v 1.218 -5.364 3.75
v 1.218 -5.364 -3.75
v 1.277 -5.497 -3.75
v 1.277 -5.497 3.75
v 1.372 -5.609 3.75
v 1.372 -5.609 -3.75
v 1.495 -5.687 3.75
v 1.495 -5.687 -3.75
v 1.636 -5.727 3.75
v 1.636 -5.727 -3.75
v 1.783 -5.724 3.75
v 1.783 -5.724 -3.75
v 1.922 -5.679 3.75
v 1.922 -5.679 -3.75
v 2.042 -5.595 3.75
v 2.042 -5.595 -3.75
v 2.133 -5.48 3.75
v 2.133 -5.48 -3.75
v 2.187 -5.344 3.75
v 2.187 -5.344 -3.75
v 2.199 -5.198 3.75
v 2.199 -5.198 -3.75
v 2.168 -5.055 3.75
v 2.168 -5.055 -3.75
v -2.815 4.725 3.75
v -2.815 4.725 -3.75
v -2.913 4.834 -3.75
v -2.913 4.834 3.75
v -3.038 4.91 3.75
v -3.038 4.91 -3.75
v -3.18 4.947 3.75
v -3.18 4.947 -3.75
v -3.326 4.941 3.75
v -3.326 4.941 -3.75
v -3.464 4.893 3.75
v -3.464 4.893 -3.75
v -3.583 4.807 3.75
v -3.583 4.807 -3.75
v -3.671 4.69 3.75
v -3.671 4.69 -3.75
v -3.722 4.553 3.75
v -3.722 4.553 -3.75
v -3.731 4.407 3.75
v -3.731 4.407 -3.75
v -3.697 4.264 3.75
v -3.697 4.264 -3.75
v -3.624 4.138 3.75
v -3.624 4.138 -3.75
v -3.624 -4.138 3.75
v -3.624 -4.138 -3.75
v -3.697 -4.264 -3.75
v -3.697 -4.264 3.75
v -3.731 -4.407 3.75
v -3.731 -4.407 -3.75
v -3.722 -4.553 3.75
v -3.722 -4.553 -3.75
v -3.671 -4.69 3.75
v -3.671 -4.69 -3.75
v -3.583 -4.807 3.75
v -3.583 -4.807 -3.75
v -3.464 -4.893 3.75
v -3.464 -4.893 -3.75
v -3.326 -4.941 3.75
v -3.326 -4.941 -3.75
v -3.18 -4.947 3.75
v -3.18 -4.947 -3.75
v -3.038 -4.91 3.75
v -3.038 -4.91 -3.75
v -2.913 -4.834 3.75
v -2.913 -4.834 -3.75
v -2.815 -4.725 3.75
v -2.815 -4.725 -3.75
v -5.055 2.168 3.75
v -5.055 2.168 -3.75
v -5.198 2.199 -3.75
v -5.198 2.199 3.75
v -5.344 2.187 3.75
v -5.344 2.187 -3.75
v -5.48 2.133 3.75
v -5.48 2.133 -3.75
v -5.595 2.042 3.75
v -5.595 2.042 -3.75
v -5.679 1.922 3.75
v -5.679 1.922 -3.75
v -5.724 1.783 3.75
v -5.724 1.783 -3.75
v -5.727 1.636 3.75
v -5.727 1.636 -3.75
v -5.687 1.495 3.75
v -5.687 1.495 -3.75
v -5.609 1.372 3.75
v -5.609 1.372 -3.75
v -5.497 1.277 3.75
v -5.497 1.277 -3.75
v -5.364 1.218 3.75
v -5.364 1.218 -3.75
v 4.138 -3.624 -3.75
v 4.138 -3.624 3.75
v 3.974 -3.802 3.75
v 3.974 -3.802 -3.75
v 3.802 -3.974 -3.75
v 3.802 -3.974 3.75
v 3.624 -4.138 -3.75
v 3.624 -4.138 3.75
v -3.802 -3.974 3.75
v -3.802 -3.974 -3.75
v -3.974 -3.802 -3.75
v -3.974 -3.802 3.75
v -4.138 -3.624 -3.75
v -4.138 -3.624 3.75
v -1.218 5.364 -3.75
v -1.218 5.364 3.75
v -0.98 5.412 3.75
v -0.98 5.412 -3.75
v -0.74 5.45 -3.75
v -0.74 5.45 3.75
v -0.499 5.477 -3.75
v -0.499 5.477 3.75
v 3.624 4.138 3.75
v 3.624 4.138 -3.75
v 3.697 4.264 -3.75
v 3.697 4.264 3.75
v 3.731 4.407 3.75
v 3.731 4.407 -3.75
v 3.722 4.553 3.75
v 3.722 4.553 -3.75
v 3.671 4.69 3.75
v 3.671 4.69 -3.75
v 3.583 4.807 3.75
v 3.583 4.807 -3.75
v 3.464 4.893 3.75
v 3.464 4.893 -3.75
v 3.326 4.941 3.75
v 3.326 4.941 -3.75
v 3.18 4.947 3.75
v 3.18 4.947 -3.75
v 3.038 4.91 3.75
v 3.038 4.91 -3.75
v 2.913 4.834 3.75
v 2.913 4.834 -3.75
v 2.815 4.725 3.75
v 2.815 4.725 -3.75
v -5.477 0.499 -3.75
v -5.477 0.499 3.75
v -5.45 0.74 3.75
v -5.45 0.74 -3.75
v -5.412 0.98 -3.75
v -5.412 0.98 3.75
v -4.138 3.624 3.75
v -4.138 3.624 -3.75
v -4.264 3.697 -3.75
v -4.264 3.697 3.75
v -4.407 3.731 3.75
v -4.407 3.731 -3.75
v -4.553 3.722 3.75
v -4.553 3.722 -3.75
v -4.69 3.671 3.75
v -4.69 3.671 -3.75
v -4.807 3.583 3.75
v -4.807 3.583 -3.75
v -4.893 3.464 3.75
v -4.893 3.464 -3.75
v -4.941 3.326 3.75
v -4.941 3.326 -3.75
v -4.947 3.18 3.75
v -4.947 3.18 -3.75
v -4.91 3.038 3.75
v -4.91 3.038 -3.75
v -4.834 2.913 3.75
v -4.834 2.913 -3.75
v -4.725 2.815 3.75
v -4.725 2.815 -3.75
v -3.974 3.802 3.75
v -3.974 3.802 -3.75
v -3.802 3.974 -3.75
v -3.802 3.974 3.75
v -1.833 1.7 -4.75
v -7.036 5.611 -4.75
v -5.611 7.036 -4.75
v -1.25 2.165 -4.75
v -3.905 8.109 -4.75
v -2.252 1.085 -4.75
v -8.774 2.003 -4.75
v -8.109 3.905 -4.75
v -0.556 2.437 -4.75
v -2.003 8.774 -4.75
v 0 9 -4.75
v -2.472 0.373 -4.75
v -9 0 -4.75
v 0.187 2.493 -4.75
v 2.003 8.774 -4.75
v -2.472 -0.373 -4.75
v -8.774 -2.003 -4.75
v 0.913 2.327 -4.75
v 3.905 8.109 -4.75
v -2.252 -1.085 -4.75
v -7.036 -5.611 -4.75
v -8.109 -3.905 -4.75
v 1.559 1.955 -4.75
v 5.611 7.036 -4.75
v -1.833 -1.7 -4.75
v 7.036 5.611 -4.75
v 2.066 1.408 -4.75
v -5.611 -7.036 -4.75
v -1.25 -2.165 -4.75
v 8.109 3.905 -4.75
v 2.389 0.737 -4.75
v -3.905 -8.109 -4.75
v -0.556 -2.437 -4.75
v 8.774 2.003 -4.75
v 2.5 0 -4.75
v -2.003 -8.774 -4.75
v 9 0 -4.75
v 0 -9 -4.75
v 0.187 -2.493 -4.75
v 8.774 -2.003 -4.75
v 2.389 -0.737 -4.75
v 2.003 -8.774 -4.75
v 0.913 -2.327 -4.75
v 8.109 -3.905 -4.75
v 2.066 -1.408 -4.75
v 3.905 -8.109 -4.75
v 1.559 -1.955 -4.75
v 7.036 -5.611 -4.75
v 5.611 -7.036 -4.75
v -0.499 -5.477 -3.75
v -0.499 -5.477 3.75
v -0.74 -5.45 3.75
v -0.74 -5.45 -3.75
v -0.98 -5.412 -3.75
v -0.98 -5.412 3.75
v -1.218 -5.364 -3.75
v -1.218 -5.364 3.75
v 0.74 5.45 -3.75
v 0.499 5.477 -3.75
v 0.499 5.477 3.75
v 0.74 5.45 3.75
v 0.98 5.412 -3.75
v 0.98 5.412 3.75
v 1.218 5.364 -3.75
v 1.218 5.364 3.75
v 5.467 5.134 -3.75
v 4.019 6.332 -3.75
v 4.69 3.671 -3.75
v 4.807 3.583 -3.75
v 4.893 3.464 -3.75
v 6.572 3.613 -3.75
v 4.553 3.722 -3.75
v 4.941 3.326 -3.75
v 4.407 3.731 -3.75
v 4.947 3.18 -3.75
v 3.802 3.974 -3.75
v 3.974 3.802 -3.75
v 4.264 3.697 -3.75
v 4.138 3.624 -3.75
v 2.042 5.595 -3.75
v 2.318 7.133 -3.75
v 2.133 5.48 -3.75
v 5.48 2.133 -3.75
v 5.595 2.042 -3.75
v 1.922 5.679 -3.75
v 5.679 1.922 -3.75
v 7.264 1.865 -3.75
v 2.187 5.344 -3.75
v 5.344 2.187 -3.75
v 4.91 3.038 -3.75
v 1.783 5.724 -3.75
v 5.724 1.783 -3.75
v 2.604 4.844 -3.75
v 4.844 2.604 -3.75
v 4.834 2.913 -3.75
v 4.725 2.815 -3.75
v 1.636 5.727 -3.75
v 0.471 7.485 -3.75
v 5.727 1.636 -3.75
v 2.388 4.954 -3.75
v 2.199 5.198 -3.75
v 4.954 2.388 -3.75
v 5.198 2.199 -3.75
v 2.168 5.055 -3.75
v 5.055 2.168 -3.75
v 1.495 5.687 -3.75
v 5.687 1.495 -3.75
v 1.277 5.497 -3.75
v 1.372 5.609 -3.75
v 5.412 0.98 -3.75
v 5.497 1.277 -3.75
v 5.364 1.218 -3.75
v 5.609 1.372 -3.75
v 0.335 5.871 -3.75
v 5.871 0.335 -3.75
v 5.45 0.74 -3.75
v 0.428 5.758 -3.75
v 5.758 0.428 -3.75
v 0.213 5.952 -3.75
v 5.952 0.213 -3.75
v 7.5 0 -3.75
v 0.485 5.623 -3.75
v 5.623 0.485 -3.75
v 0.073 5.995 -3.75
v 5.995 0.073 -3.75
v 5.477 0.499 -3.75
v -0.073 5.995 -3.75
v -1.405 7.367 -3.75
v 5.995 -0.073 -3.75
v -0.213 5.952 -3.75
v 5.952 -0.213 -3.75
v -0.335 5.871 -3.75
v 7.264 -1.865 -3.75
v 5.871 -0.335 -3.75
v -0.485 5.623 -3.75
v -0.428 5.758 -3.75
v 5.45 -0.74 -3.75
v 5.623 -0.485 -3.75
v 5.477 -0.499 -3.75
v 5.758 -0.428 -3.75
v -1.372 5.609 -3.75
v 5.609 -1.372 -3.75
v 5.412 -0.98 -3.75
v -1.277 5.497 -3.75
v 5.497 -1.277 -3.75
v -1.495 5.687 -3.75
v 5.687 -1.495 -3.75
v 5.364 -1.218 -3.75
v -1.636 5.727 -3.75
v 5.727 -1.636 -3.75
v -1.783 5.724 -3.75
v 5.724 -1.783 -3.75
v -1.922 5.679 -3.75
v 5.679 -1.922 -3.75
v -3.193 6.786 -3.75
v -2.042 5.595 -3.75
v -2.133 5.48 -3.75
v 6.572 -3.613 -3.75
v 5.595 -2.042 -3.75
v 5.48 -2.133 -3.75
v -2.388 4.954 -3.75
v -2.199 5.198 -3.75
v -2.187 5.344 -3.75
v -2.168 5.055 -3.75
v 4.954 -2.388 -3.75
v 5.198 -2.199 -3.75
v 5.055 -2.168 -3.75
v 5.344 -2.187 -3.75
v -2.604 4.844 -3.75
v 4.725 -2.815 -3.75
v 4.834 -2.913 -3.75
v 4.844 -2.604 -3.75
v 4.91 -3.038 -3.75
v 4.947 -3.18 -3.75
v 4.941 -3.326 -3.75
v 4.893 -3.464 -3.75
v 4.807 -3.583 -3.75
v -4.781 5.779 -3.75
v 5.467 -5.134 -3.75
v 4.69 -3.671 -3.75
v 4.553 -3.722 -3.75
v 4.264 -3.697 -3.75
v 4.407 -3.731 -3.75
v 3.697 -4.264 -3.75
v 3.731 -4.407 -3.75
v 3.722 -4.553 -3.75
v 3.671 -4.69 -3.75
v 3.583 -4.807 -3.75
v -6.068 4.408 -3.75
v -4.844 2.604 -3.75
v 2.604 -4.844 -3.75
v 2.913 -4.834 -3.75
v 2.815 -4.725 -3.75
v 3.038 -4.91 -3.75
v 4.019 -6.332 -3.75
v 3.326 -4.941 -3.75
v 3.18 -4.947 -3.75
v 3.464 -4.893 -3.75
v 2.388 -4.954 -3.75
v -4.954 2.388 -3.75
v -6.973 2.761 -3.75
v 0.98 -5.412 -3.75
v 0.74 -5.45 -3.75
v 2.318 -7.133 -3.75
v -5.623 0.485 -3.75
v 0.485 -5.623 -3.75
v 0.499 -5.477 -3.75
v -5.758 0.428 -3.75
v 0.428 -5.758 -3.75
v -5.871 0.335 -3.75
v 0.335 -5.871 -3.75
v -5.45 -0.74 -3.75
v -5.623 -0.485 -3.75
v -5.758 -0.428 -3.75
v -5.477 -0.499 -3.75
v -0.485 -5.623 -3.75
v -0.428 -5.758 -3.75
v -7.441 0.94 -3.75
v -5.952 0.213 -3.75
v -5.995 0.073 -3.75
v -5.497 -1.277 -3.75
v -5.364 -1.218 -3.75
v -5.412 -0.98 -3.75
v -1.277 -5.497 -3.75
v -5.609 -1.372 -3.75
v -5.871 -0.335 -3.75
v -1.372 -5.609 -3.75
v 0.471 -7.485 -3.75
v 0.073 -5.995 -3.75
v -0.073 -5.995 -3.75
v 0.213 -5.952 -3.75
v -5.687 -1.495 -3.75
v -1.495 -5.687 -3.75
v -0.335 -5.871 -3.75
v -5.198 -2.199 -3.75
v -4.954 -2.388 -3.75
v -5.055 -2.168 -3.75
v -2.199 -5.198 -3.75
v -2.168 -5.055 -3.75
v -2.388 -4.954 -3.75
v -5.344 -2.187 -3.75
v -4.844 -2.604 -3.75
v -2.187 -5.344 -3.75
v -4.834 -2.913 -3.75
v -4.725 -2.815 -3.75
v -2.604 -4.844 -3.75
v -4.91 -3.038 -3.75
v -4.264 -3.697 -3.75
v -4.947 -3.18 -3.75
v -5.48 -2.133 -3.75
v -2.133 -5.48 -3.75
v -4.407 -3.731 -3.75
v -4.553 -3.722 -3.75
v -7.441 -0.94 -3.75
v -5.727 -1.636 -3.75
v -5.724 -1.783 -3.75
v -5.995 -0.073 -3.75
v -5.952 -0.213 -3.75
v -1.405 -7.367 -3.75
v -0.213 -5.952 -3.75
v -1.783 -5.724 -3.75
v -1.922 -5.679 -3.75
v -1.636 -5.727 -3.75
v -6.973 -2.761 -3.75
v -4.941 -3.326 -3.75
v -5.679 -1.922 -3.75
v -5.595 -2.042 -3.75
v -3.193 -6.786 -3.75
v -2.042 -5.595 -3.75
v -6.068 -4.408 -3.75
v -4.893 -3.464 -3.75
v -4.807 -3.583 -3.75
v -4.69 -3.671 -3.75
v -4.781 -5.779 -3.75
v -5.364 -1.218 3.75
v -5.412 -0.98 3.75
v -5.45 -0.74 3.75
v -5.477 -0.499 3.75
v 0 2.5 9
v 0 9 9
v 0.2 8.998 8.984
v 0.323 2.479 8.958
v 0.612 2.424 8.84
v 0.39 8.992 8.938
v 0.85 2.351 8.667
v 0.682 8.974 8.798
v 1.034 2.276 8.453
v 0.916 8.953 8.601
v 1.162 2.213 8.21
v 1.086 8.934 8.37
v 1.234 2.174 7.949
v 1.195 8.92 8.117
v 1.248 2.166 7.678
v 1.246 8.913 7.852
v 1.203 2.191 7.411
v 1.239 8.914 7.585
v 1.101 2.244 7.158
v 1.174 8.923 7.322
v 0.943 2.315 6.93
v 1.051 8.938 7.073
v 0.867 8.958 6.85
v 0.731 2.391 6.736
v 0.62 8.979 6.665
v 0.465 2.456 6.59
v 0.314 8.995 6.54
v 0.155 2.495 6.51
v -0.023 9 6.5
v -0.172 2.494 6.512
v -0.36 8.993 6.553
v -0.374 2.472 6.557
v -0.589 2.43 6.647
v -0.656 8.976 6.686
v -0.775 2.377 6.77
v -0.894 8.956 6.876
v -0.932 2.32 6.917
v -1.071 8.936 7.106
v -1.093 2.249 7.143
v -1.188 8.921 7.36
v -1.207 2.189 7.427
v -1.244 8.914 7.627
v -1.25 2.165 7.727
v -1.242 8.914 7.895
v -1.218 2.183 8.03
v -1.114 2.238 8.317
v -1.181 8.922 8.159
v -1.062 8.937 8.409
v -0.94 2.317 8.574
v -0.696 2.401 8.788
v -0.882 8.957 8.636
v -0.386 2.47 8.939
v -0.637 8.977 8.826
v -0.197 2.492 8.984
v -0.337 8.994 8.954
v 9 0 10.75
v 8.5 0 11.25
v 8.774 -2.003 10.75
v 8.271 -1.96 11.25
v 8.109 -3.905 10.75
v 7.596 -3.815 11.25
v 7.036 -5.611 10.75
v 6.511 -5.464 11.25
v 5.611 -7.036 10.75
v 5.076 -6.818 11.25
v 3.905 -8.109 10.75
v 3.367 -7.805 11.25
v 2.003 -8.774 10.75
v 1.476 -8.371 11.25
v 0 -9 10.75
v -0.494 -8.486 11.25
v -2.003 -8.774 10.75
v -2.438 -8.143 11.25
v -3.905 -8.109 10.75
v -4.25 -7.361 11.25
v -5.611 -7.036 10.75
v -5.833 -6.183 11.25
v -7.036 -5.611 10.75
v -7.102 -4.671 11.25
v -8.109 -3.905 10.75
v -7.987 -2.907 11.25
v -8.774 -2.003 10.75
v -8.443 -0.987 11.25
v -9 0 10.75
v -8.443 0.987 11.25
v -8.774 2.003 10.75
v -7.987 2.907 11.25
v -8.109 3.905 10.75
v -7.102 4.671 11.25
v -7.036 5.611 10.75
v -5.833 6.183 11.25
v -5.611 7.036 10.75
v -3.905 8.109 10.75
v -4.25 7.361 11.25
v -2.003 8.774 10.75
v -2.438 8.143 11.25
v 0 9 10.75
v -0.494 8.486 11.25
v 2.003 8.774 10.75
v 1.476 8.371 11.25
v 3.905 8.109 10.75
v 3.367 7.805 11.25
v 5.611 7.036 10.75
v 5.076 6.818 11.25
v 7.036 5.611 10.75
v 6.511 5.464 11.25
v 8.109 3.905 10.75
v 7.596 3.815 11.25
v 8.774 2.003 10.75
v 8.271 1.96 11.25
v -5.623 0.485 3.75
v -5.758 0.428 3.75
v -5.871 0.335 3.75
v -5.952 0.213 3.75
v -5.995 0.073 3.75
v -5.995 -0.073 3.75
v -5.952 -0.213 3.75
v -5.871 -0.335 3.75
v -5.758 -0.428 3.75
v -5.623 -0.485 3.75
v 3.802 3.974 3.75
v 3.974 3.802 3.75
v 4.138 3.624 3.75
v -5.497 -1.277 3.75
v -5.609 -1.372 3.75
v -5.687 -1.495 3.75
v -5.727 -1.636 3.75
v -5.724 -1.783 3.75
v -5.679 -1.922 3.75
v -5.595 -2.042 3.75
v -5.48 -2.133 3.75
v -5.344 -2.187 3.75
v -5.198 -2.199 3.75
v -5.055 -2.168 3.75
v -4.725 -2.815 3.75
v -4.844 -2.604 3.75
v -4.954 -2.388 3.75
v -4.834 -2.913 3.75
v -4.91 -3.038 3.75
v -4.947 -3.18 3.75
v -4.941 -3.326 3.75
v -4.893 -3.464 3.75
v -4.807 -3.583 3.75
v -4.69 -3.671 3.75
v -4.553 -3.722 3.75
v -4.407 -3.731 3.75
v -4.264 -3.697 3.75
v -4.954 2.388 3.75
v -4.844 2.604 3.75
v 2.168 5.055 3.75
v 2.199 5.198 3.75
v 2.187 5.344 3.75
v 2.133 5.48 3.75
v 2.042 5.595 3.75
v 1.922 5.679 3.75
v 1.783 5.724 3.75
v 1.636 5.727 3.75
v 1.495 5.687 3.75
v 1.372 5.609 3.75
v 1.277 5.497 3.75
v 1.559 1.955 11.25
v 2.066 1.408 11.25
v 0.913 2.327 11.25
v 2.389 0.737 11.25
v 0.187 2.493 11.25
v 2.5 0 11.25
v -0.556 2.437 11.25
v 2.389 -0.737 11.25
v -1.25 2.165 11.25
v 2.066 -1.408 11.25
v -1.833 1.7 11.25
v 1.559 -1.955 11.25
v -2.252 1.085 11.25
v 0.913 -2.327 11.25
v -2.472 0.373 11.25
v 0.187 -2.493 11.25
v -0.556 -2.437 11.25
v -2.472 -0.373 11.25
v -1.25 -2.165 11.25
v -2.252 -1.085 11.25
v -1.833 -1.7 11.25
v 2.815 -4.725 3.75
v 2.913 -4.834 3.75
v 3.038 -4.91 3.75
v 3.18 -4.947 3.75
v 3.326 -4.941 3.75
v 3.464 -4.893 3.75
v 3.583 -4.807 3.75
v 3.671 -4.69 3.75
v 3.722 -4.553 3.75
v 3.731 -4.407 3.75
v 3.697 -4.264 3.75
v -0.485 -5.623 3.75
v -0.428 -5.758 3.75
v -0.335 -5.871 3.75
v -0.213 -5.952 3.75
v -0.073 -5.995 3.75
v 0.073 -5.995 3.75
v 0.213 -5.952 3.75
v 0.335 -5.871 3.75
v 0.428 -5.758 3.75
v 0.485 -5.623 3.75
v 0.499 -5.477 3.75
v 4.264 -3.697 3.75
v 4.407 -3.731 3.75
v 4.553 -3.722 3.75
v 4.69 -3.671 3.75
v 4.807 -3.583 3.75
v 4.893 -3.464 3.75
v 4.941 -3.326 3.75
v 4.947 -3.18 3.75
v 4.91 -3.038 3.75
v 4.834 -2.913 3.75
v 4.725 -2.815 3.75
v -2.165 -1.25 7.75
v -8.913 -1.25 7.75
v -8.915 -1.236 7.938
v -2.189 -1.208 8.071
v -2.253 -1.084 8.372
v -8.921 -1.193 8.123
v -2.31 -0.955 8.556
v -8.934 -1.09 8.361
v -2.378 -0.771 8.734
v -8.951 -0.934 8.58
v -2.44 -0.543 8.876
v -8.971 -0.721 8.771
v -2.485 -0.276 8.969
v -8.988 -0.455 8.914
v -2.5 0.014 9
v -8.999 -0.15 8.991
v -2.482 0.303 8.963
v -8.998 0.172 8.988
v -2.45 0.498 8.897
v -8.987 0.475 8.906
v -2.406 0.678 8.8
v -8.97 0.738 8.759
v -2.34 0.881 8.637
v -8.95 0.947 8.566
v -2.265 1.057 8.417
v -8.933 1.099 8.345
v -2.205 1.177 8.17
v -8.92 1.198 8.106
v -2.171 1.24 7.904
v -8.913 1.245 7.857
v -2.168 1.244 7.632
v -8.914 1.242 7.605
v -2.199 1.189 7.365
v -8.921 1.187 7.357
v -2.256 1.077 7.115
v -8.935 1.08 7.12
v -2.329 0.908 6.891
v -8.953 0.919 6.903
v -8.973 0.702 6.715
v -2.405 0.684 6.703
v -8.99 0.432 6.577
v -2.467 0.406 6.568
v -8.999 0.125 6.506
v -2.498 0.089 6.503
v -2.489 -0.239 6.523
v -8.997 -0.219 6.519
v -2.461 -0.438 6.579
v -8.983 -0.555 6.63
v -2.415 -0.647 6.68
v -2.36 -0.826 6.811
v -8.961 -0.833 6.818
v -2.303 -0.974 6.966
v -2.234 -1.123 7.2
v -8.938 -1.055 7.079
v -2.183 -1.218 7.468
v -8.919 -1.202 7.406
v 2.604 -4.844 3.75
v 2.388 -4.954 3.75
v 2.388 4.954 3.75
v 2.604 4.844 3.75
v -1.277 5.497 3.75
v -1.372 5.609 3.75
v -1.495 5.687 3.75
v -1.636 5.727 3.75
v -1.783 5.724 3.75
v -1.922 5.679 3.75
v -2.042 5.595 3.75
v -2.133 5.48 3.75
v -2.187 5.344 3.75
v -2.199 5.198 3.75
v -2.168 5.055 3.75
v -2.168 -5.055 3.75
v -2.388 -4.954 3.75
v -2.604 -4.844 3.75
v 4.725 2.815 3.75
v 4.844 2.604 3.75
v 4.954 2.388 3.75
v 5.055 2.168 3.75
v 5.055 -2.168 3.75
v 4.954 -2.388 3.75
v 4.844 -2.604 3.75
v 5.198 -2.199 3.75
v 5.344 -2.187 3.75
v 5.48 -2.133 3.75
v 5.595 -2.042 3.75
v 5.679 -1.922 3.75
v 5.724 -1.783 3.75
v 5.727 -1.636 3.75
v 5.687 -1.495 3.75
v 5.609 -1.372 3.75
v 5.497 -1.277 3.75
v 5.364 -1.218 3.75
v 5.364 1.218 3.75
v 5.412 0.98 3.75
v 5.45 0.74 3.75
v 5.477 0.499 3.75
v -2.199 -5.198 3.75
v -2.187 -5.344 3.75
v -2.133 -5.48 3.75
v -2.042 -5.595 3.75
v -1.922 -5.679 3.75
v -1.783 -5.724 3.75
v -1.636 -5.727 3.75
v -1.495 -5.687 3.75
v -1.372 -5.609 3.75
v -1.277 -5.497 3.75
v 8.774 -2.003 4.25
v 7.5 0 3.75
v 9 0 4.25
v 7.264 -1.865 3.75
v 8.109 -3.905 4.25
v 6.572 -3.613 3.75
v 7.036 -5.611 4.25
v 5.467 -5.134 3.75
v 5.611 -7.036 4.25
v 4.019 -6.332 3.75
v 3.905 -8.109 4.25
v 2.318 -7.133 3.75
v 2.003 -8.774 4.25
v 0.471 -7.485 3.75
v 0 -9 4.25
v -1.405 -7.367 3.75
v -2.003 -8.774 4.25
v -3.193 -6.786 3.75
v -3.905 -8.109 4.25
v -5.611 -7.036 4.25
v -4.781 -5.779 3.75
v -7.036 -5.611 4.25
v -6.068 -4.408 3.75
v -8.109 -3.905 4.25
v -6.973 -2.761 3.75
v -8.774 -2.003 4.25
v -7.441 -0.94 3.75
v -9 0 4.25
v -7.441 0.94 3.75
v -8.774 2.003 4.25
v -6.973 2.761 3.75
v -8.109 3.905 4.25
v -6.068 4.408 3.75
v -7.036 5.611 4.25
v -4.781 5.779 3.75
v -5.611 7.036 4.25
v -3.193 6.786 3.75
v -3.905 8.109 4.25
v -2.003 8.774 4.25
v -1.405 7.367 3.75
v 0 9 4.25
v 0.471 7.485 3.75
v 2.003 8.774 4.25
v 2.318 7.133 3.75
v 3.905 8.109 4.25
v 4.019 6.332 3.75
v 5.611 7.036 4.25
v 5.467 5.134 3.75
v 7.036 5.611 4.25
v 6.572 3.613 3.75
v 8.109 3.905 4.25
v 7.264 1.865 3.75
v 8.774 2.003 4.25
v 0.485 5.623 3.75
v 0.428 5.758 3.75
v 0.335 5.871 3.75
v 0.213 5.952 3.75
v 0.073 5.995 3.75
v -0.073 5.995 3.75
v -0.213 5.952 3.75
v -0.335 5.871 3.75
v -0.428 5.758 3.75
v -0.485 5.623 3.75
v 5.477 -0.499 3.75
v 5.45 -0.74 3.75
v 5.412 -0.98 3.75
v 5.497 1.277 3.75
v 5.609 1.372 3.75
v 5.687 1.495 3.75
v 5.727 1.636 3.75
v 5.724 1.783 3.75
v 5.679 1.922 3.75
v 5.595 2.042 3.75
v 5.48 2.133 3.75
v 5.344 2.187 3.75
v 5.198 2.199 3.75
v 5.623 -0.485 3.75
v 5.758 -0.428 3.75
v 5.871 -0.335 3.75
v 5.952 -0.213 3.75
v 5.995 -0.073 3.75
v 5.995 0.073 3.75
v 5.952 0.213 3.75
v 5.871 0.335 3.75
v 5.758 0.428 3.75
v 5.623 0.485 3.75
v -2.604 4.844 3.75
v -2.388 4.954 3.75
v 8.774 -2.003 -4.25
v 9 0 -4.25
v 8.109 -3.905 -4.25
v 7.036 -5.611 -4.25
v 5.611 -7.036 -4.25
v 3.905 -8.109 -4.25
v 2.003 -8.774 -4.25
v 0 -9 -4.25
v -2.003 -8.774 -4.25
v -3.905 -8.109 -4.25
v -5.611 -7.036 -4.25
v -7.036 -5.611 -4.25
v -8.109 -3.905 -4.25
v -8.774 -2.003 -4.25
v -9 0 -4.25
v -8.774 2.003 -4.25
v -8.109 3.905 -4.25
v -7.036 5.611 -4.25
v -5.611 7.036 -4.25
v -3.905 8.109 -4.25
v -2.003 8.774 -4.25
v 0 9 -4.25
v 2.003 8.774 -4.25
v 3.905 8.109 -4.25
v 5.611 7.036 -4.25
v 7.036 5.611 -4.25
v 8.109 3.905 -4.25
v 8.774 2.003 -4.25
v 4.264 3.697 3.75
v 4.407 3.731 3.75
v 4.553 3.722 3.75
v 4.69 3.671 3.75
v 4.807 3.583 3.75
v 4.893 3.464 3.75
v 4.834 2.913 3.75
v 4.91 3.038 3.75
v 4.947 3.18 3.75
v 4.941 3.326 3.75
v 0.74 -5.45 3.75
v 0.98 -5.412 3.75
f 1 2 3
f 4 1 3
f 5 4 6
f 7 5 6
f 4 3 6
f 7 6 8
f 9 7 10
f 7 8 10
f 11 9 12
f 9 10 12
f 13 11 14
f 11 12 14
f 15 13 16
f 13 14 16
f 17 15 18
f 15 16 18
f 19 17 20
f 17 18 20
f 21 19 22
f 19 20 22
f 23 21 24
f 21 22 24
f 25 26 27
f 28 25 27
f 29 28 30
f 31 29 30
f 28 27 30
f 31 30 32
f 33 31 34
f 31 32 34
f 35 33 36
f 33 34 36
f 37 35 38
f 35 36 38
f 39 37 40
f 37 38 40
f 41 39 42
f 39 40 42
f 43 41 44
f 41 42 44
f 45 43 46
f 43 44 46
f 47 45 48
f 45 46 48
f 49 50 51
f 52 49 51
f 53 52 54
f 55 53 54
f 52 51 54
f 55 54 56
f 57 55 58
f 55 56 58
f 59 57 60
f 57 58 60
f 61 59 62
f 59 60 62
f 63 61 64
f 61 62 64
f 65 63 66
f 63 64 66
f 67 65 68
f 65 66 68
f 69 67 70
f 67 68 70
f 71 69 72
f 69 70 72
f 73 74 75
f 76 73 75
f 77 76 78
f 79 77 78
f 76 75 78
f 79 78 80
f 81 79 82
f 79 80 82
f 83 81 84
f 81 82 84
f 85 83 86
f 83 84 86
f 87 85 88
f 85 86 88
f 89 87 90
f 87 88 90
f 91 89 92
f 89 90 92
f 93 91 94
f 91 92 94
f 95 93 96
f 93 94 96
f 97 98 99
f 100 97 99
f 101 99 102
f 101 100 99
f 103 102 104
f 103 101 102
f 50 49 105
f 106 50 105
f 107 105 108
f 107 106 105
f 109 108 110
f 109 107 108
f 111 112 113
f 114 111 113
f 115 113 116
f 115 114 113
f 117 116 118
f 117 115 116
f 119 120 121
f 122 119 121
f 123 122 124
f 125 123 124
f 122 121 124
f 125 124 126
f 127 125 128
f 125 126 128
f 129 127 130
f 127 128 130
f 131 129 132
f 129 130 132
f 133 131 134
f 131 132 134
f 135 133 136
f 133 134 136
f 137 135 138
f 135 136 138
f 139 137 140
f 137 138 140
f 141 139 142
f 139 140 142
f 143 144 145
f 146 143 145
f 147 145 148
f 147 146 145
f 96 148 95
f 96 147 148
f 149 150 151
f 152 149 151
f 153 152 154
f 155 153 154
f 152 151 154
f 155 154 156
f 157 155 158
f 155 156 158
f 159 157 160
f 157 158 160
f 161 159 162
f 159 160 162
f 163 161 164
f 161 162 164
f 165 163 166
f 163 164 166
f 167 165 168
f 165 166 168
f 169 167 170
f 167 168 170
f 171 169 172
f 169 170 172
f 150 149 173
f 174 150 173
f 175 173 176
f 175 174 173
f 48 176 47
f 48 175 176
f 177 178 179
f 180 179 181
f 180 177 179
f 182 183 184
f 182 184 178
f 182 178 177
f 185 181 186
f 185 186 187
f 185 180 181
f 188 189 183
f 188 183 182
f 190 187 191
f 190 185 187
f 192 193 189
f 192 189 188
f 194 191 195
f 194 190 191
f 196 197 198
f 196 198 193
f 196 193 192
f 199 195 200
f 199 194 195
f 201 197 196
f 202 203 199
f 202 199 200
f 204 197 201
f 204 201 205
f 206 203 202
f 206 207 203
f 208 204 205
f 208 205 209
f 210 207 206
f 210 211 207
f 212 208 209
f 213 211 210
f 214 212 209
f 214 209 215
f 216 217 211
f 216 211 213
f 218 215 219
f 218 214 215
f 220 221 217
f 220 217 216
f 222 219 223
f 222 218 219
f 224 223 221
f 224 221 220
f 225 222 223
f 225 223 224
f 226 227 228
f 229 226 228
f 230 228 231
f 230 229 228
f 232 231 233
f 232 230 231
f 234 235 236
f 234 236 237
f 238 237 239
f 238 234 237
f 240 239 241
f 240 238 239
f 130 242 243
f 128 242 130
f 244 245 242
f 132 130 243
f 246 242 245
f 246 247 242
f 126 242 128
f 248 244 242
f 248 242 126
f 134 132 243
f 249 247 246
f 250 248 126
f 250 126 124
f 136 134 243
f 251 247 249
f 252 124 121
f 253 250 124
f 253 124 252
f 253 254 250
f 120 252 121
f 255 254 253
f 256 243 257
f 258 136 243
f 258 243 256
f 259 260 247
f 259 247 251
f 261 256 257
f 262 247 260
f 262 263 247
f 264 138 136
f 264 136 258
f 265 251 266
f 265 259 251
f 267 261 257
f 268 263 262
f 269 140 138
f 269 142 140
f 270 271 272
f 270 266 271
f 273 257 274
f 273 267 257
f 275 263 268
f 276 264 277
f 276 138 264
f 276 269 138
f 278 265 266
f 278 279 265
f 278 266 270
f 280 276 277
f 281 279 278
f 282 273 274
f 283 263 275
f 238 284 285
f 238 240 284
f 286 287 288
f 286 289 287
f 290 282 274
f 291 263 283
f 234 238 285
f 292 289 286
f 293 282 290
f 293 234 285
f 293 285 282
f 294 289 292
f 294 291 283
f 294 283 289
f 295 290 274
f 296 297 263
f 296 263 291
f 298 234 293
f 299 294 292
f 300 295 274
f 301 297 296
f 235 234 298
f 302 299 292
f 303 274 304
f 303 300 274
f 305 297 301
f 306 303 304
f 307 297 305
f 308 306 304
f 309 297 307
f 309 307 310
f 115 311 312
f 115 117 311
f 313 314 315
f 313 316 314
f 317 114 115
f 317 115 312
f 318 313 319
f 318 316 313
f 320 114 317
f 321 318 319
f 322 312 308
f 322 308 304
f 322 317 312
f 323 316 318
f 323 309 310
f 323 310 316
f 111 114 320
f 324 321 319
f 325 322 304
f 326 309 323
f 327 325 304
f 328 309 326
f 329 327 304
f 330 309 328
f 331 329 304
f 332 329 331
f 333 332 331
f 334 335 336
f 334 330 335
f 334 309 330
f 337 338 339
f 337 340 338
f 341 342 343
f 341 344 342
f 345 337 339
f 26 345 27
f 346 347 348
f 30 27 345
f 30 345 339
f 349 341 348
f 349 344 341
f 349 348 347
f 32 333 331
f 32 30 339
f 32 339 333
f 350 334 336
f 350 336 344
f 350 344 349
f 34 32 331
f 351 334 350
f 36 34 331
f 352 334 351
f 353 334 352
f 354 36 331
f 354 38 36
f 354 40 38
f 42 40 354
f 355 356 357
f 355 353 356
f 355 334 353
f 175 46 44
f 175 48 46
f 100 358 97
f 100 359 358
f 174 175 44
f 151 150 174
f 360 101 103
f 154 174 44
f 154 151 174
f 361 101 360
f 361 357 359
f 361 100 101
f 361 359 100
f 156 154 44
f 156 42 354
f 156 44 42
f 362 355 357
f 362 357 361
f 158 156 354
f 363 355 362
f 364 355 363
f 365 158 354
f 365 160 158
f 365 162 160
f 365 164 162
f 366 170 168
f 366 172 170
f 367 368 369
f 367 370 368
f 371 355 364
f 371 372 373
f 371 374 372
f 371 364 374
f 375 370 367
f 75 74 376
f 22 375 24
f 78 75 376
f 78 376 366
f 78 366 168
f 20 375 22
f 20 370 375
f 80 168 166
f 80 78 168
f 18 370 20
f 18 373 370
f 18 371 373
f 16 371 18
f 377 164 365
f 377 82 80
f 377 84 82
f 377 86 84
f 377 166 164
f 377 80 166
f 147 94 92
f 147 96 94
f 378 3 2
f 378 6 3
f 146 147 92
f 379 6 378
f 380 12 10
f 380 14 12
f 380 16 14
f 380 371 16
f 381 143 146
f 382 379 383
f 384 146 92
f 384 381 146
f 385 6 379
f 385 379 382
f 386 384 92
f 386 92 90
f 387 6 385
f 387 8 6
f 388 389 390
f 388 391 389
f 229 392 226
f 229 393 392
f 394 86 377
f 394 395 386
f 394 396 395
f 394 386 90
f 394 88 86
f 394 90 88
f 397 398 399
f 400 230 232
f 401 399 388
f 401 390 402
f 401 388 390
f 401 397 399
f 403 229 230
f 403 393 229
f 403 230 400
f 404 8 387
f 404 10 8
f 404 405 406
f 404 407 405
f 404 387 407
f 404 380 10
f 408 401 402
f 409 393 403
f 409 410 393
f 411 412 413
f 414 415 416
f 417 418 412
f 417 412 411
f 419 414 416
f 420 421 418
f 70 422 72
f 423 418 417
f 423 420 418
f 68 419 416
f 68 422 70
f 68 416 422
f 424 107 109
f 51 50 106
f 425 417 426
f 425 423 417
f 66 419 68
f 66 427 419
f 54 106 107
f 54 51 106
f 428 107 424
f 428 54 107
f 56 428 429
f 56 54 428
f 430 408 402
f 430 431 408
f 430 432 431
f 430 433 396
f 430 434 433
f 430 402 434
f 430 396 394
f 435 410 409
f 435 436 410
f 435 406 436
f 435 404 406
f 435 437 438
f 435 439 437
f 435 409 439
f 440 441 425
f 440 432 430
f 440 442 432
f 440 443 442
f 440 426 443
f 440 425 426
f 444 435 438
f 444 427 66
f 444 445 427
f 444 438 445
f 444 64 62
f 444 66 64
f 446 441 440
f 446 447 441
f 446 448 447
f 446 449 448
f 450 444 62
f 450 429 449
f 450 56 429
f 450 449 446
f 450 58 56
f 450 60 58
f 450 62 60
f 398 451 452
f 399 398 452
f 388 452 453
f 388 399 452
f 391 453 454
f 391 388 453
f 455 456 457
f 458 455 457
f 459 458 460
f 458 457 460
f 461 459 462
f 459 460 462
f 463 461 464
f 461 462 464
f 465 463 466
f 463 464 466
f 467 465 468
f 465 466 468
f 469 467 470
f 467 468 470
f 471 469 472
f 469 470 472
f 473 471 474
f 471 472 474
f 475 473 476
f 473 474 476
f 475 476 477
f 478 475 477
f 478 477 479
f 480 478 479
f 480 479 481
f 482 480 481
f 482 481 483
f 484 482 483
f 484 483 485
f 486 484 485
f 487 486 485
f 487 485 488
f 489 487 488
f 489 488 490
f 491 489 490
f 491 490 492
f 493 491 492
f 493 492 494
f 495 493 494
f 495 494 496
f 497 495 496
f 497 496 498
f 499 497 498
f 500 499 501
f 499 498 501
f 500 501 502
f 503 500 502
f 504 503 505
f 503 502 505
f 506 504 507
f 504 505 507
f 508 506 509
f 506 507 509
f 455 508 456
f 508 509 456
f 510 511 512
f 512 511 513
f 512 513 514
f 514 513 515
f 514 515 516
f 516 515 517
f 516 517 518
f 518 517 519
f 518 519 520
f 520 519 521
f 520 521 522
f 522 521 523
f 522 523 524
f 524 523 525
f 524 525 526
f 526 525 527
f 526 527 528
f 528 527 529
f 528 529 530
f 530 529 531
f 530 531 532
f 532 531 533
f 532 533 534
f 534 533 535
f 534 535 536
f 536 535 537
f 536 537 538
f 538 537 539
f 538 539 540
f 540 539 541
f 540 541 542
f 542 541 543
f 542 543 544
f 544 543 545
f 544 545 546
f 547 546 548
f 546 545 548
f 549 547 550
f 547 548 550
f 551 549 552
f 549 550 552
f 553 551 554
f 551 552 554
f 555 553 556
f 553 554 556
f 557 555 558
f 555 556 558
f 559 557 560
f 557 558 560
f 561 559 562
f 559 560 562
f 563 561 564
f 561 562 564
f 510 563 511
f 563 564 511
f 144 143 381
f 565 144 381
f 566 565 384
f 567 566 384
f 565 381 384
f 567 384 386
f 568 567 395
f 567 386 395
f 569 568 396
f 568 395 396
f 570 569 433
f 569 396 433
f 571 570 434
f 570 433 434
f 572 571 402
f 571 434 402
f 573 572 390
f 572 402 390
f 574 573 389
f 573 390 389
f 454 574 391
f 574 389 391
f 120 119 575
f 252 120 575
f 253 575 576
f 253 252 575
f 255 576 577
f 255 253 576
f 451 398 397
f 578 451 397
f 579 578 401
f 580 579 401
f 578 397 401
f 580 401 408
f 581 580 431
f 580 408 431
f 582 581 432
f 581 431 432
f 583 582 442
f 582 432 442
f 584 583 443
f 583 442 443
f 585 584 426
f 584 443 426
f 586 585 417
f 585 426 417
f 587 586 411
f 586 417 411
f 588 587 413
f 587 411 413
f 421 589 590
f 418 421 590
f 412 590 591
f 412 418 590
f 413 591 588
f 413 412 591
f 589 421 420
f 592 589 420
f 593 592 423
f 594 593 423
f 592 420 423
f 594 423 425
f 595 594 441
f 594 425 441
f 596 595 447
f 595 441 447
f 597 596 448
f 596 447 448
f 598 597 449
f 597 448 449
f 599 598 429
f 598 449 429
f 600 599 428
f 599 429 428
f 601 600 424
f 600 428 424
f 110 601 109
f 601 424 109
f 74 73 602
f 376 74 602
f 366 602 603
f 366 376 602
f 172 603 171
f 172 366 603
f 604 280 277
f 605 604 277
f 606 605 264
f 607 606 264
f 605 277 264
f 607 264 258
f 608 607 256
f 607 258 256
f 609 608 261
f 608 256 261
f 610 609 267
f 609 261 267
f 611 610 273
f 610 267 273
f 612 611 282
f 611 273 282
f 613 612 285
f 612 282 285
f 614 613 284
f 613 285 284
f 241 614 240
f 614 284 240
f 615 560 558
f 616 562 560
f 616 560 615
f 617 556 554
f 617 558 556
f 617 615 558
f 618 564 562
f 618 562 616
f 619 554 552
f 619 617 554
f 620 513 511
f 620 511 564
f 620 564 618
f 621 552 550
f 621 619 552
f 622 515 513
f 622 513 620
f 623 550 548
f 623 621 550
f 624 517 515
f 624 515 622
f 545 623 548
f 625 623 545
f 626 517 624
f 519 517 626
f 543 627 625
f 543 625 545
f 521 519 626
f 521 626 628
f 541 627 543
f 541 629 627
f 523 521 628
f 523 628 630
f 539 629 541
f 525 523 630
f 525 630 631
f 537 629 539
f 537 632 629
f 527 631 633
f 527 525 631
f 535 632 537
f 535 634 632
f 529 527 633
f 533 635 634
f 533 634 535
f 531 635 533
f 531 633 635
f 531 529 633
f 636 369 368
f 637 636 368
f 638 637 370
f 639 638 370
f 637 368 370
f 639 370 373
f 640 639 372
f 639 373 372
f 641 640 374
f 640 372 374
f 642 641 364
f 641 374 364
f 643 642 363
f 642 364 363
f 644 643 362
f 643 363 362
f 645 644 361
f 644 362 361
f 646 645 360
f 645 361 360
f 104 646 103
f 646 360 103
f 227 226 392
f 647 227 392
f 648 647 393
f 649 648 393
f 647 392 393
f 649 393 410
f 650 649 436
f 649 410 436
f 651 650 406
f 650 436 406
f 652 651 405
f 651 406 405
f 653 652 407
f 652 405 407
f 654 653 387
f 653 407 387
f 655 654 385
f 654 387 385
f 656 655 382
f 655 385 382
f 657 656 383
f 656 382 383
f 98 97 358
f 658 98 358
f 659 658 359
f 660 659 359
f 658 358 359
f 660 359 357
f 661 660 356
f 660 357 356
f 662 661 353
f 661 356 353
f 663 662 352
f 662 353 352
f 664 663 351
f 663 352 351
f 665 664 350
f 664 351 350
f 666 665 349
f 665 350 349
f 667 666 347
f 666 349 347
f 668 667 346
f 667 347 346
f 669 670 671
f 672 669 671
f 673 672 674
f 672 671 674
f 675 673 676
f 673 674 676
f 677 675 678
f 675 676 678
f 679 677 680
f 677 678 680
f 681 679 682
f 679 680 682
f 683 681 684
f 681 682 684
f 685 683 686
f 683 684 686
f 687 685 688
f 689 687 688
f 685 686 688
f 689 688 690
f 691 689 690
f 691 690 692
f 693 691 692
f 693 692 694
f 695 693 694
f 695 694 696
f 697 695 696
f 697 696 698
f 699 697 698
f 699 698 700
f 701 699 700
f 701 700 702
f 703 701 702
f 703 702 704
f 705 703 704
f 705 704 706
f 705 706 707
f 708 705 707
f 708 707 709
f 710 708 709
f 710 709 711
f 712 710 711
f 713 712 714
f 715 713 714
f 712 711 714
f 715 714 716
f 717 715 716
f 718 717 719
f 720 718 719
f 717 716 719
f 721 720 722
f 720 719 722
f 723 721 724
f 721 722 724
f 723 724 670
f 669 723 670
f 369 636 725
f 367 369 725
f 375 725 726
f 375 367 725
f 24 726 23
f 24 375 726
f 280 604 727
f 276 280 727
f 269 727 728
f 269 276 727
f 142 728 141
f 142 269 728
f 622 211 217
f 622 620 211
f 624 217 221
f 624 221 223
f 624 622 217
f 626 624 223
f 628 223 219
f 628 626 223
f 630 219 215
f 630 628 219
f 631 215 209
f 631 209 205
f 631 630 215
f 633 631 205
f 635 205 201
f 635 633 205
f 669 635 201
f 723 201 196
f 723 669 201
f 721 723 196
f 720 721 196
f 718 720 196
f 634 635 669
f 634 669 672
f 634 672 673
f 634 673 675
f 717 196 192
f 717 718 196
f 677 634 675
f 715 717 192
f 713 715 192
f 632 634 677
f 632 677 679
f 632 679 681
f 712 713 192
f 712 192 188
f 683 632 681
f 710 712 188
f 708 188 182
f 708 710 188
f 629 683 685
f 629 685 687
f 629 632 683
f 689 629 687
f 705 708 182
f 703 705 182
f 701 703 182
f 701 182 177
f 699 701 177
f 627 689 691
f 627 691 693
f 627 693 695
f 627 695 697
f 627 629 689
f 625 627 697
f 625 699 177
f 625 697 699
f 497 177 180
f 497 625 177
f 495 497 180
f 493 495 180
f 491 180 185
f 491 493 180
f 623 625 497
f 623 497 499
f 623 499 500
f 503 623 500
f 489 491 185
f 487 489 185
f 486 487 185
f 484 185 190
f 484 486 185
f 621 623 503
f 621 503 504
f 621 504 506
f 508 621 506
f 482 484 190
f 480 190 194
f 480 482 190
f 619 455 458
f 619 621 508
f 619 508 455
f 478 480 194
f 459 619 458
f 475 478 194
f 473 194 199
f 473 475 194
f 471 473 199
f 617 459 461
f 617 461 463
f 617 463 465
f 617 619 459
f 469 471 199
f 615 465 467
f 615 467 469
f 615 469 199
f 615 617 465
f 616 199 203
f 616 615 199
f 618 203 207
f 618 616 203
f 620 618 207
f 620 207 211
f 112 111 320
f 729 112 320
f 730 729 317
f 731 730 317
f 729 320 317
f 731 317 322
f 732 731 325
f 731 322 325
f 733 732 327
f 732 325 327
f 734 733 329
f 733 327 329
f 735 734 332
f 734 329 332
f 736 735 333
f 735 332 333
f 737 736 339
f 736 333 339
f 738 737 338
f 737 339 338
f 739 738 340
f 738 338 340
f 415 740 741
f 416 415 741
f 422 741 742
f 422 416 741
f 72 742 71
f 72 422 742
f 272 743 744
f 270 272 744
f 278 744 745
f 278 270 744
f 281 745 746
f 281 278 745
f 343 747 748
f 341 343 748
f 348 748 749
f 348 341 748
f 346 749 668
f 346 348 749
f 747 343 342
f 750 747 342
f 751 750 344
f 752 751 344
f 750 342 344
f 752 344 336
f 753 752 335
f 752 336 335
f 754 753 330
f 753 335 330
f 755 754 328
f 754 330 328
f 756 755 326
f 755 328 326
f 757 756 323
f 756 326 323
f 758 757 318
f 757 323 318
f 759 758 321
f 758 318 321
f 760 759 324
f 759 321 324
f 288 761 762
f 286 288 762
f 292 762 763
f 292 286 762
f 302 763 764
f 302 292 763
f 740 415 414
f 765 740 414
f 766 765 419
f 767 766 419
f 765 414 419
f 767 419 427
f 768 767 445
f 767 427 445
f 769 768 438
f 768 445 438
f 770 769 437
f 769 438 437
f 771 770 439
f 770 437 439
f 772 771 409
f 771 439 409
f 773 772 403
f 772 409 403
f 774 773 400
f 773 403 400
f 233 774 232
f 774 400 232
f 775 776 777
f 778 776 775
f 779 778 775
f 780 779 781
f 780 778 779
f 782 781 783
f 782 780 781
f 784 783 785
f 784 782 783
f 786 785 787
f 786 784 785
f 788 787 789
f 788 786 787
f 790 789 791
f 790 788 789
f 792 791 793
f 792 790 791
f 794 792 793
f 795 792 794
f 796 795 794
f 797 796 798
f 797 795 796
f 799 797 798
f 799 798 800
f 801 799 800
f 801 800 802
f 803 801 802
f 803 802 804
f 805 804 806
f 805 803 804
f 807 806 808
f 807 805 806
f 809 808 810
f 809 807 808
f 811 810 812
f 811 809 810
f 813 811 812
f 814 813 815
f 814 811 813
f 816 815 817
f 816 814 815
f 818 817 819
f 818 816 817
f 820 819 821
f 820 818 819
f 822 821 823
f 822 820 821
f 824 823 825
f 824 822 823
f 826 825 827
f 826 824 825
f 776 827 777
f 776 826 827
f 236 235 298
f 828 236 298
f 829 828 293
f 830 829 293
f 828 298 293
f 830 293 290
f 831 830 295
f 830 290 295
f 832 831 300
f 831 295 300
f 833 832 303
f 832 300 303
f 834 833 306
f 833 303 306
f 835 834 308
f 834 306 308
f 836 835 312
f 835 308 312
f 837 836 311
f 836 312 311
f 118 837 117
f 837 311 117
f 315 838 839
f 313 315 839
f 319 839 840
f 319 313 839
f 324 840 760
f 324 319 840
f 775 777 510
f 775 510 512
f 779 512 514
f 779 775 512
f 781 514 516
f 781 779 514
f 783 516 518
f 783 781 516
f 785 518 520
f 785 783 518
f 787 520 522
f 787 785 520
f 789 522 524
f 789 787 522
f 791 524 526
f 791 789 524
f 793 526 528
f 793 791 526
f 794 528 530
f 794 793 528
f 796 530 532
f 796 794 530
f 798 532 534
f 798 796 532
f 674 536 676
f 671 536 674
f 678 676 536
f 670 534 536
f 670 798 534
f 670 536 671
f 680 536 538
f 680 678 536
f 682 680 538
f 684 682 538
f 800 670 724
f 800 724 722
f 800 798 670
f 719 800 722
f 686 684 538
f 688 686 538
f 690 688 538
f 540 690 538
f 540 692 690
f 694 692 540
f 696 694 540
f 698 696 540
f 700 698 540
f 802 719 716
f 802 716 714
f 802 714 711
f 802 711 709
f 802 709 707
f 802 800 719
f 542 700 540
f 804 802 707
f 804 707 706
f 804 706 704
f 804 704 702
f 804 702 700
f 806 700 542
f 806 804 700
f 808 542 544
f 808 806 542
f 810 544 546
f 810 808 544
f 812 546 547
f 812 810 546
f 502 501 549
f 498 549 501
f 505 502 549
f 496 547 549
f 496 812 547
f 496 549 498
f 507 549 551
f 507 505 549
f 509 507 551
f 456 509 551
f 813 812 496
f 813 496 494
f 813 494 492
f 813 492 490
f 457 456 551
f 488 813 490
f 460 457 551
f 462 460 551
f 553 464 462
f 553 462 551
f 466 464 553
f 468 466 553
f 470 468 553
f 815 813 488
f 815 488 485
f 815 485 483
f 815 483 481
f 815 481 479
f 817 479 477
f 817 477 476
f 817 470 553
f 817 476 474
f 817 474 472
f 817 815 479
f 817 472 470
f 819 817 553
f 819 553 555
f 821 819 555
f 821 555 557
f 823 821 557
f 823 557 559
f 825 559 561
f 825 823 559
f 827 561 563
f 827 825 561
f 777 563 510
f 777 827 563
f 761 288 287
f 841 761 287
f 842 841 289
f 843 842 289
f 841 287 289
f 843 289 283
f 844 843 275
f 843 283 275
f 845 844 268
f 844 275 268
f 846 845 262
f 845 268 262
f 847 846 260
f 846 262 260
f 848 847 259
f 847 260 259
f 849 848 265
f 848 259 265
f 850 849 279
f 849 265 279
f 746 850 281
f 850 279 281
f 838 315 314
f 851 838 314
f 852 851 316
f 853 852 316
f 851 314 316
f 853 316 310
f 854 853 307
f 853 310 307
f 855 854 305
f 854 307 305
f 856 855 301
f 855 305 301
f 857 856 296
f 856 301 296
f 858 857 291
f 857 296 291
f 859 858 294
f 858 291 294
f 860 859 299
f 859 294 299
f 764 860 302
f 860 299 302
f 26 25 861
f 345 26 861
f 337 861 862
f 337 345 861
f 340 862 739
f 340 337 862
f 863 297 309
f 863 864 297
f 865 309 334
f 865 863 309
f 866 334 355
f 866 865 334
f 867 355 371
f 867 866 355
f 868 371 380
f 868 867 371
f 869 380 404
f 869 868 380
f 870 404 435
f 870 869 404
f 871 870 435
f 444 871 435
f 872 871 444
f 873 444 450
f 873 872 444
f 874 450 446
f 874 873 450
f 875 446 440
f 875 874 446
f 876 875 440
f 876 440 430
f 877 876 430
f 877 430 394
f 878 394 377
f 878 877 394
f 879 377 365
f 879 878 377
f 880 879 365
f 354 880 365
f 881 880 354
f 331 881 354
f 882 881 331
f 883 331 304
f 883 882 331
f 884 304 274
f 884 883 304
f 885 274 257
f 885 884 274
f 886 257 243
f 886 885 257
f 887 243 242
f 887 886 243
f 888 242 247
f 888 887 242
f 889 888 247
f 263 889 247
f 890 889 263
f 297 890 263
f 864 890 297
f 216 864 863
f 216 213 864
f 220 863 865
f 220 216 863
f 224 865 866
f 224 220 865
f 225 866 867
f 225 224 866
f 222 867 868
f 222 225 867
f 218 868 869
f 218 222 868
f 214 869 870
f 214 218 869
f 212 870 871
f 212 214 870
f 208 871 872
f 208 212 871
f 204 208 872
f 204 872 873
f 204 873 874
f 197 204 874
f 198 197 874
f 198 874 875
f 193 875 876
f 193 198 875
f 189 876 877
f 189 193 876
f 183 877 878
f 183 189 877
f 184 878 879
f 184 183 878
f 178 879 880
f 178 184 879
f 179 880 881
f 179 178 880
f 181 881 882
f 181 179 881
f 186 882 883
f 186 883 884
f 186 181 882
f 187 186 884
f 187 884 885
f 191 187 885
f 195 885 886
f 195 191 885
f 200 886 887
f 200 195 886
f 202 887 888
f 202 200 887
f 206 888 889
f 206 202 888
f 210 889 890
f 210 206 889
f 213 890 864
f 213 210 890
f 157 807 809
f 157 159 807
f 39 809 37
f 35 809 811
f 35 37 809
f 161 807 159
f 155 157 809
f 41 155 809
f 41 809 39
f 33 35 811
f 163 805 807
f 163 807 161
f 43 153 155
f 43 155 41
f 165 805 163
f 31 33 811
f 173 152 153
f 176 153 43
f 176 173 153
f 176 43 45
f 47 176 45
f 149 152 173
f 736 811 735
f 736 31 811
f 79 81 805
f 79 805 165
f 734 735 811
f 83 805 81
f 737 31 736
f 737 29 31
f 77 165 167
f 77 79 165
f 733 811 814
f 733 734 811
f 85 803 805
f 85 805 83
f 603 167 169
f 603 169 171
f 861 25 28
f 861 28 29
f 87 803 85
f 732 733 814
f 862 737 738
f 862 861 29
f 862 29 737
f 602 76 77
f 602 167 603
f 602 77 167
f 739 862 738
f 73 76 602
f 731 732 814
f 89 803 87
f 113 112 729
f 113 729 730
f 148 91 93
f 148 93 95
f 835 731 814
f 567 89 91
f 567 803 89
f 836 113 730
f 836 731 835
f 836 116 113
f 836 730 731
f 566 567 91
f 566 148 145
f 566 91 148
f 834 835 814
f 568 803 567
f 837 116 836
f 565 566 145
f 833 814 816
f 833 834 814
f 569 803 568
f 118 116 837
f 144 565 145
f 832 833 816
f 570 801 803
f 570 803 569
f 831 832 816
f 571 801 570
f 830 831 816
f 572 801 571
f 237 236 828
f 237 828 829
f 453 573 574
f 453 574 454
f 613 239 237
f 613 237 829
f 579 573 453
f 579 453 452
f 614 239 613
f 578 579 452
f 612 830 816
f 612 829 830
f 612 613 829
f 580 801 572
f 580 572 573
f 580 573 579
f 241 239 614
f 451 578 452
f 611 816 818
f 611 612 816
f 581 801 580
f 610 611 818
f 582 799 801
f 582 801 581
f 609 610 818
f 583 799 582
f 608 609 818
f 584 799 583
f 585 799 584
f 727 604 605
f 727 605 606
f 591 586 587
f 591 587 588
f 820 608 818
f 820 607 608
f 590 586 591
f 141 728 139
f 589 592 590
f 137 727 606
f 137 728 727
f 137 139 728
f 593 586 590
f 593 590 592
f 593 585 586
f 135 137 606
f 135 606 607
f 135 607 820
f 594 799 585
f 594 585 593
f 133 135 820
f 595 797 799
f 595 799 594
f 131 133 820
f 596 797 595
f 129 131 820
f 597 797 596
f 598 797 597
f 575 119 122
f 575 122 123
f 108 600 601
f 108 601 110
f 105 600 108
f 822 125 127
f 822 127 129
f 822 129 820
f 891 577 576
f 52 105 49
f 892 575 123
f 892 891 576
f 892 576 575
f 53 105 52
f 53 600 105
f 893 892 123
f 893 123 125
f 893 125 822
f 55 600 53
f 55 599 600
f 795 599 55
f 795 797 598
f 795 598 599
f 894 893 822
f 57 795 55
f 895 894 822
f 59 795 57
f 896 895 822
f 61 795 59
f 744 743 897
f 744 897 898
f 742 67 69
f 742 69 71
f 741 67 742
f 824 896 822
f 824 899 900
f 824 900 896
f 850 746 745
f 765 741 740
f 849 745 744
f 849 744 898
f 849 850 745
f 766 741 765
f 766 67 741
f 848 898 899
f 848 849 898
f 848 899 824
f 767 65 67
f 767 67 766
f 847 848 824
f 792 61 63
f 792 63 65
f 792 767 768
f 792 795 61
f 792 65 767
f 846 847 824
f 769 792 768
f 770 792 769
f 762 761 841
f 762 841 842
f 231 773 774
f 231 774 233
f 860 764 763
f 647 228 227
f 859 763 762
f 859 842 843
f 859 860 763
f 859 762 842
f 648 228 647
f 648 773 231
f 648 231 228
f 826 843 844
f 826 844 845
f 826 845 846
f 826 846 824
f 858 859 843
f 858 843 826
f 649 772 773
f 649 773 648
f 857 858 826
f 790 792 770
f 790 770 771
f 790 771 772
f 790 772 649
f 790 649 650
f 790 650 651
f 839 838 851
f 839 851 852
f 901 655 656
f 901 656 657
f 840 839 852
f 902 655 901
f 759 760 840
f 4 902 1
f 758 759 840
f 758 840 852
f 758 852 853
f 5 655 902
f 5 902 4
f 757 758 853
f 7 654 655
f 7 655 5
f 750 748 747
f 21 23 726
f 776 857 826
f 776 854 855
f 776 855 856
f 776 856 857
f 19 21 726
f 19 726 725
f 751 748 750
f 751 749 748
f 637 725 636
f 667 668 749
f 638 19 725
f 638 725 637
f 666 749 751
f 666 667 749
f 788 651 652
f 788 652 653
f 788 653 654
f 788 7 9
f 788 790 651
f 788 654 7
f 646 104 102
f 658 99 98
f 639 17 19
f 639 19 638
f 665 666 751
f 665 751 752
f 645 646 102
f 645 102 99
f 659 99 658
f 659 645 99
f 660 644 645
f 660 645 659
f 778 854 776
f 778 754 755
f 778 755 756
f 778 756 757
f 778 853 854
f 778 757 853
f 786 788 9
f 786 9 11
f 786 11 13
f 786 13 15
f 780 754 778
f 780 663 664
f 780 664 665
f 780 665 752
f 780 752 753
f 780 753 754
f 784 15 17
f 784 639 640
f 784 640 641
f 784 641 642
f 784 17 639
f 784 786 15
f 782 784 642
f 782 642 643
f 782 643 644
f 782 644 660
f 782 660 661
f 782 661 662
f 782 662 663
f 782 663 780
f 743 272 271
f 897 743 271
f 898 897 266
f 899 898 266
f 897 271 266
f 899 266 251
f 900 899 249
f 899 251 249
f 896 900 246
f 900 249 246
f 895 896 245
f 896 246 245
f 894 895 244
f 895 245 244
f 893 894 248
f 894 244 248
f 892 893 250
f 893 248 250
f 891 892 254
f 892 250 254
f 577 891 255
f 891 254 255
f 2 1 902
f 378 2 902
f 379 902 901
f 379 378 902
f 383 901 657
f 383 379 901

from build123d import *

# Parameters (mm, degrees)
M3X0_5_TAPPED_HOLE1_REACH           = 25.691
M3X0_5_TAPPED_HOLE1_BORE_R          = 1.25
M3X0_5_TAPPED_HOLE1_ON_FACE_2_REACH = 25.691
M3X0_5_TAPPED_HOLE1_BORE_2_R        = 1.25
CHAMFER1_SIZE                       = 0.5
BOSS_EXTRUDE1_START                 = 7.5
BOSS_EXTRUDE1_DEPTH                 = 7.5
CIRPATTERN1_COUNT                   = 20


with BuildPart() as part:
    # Sketch1 → Revolve1 (revolve)
    with BuildSketch(Plane(origin=(0, 0, 0), x_dir=(0, 0, -1), z_dir=(1, 0, 0)), mode=Mode.PRIVATE) as revolve1_sk:
        Polygon((-3.75, 7.5), (-3.75, 5.5), (3.75, 5.5), (3.75, 7.5), (4.25, 9), (4.75, 9), (4.75, 2.5), (-11.25, 2.5), (-11.25, 9), (-4.25, 9), align=None)
    revolve(revolve1_sk.sketch.rotate(Axis((0, 0, 0), (0, 0, -1)), 90), axis=Axis((0, 0, 0), (0, 0, -1)))

    # M3x0.5 Tapped Hole1 bore (on position points) → M3x0.5 Tapped Hole1 (cut, up to next)
    with BuildSketch(Plane(origin=(-9, 0, 7.75), x_dir=(0, -1, 0), z_dir=(-1, 0, 0)), mode=Mode.PRIVATE) as m3x0_5_tapped_hole1_sk1:
        Circle(M3X0_5_TAPPED_HOLE1_BORE_R)
    m3x0_5_tapped_hole1_tool1 = extrude(m3x0_5_tapped_hole1_sk1.sketch, amount=-M3X0_5_TAPPED_HOLE1_REACH, mode=Mode.PRIVATE) & part.part
    add(m3x0_5_tapped_hole1_tool1.solids().sort_by_distance((-9, 0, 7.75))[0], mode=Mode.SUBTRACT)

    # M3x0.5 Tapped Hole1 bore 2 (on position points) → M3x0.5 Tapped Hole1 on face 2 (cut, up to next)
    with BuildSketch(Plane(origin=(0, 9, 7.75), x_dir=(0, 0, 1), z_dir=(0, 1, 0)), mode=Mode.PRIVATE) as m3x0_5_tapped_hole1_on_face_2_sk1:
        Circle(M3X0_5_TAPPED_HOLE1_BORE_2_R)
    m3x0_5_tapped_hole1_on_face_2_tool1 = extrude(m3x0_5_tapped_hole1_on_face_2_sk1.sketch, amount=-M3X0_5_TAPPED_HOLE1_ON_FACE_2_REACH, mode=Mode.PRIVATE) & part.part
    add(m3x0_5_tapped_hole1_on_face_2_tool1.solids().sort_by_distance((0, 9, 7.75))[0], mode=Mode.SUBTRACT)

    # Chamfer1
    chamfer1_edges = [part.edges().sort_by_distance(p)[0] for p in [
        (-9, 0, 11.25),
    ]]
    chamfer(chamfer1_edges, length=CHAMFER1_SIZE)

    # Sketch4 → Boss-Extrude1 (add)
    with BuildSketch(Plane(origin=(0, 0, 3.75), x_dir=(-1, 0, 0), z_dir=(0, 0, -1)).offset(BOSS_EXTRUDE1_START)):
        with BuildLine():
            ThreePointArc((-0.499483204, 5.477272727), (0, 6), (0.499483204, 5.477272727))
            ThreePointArc((0.499483204, 5.477272727), (0, 5.5), (-0.499483204, 5.477272727))
        make_face()
    boss_extrude1 = extrude(amount=-BOSS_EXTRUDE1_DEPTH)

    # CirPattern1: Boss-Extrude1 ×20 about axis
    cirpattern1_axis = Axis((0, 0, 0), (0, 0, 1))
    for i in range(1, CIRPATTERN1_COUNT):
        add(boss_extrude1.rotate(cirpattern1_axis, i * 360 / CIRPATTERN1_COUNT))


solid = part.part
